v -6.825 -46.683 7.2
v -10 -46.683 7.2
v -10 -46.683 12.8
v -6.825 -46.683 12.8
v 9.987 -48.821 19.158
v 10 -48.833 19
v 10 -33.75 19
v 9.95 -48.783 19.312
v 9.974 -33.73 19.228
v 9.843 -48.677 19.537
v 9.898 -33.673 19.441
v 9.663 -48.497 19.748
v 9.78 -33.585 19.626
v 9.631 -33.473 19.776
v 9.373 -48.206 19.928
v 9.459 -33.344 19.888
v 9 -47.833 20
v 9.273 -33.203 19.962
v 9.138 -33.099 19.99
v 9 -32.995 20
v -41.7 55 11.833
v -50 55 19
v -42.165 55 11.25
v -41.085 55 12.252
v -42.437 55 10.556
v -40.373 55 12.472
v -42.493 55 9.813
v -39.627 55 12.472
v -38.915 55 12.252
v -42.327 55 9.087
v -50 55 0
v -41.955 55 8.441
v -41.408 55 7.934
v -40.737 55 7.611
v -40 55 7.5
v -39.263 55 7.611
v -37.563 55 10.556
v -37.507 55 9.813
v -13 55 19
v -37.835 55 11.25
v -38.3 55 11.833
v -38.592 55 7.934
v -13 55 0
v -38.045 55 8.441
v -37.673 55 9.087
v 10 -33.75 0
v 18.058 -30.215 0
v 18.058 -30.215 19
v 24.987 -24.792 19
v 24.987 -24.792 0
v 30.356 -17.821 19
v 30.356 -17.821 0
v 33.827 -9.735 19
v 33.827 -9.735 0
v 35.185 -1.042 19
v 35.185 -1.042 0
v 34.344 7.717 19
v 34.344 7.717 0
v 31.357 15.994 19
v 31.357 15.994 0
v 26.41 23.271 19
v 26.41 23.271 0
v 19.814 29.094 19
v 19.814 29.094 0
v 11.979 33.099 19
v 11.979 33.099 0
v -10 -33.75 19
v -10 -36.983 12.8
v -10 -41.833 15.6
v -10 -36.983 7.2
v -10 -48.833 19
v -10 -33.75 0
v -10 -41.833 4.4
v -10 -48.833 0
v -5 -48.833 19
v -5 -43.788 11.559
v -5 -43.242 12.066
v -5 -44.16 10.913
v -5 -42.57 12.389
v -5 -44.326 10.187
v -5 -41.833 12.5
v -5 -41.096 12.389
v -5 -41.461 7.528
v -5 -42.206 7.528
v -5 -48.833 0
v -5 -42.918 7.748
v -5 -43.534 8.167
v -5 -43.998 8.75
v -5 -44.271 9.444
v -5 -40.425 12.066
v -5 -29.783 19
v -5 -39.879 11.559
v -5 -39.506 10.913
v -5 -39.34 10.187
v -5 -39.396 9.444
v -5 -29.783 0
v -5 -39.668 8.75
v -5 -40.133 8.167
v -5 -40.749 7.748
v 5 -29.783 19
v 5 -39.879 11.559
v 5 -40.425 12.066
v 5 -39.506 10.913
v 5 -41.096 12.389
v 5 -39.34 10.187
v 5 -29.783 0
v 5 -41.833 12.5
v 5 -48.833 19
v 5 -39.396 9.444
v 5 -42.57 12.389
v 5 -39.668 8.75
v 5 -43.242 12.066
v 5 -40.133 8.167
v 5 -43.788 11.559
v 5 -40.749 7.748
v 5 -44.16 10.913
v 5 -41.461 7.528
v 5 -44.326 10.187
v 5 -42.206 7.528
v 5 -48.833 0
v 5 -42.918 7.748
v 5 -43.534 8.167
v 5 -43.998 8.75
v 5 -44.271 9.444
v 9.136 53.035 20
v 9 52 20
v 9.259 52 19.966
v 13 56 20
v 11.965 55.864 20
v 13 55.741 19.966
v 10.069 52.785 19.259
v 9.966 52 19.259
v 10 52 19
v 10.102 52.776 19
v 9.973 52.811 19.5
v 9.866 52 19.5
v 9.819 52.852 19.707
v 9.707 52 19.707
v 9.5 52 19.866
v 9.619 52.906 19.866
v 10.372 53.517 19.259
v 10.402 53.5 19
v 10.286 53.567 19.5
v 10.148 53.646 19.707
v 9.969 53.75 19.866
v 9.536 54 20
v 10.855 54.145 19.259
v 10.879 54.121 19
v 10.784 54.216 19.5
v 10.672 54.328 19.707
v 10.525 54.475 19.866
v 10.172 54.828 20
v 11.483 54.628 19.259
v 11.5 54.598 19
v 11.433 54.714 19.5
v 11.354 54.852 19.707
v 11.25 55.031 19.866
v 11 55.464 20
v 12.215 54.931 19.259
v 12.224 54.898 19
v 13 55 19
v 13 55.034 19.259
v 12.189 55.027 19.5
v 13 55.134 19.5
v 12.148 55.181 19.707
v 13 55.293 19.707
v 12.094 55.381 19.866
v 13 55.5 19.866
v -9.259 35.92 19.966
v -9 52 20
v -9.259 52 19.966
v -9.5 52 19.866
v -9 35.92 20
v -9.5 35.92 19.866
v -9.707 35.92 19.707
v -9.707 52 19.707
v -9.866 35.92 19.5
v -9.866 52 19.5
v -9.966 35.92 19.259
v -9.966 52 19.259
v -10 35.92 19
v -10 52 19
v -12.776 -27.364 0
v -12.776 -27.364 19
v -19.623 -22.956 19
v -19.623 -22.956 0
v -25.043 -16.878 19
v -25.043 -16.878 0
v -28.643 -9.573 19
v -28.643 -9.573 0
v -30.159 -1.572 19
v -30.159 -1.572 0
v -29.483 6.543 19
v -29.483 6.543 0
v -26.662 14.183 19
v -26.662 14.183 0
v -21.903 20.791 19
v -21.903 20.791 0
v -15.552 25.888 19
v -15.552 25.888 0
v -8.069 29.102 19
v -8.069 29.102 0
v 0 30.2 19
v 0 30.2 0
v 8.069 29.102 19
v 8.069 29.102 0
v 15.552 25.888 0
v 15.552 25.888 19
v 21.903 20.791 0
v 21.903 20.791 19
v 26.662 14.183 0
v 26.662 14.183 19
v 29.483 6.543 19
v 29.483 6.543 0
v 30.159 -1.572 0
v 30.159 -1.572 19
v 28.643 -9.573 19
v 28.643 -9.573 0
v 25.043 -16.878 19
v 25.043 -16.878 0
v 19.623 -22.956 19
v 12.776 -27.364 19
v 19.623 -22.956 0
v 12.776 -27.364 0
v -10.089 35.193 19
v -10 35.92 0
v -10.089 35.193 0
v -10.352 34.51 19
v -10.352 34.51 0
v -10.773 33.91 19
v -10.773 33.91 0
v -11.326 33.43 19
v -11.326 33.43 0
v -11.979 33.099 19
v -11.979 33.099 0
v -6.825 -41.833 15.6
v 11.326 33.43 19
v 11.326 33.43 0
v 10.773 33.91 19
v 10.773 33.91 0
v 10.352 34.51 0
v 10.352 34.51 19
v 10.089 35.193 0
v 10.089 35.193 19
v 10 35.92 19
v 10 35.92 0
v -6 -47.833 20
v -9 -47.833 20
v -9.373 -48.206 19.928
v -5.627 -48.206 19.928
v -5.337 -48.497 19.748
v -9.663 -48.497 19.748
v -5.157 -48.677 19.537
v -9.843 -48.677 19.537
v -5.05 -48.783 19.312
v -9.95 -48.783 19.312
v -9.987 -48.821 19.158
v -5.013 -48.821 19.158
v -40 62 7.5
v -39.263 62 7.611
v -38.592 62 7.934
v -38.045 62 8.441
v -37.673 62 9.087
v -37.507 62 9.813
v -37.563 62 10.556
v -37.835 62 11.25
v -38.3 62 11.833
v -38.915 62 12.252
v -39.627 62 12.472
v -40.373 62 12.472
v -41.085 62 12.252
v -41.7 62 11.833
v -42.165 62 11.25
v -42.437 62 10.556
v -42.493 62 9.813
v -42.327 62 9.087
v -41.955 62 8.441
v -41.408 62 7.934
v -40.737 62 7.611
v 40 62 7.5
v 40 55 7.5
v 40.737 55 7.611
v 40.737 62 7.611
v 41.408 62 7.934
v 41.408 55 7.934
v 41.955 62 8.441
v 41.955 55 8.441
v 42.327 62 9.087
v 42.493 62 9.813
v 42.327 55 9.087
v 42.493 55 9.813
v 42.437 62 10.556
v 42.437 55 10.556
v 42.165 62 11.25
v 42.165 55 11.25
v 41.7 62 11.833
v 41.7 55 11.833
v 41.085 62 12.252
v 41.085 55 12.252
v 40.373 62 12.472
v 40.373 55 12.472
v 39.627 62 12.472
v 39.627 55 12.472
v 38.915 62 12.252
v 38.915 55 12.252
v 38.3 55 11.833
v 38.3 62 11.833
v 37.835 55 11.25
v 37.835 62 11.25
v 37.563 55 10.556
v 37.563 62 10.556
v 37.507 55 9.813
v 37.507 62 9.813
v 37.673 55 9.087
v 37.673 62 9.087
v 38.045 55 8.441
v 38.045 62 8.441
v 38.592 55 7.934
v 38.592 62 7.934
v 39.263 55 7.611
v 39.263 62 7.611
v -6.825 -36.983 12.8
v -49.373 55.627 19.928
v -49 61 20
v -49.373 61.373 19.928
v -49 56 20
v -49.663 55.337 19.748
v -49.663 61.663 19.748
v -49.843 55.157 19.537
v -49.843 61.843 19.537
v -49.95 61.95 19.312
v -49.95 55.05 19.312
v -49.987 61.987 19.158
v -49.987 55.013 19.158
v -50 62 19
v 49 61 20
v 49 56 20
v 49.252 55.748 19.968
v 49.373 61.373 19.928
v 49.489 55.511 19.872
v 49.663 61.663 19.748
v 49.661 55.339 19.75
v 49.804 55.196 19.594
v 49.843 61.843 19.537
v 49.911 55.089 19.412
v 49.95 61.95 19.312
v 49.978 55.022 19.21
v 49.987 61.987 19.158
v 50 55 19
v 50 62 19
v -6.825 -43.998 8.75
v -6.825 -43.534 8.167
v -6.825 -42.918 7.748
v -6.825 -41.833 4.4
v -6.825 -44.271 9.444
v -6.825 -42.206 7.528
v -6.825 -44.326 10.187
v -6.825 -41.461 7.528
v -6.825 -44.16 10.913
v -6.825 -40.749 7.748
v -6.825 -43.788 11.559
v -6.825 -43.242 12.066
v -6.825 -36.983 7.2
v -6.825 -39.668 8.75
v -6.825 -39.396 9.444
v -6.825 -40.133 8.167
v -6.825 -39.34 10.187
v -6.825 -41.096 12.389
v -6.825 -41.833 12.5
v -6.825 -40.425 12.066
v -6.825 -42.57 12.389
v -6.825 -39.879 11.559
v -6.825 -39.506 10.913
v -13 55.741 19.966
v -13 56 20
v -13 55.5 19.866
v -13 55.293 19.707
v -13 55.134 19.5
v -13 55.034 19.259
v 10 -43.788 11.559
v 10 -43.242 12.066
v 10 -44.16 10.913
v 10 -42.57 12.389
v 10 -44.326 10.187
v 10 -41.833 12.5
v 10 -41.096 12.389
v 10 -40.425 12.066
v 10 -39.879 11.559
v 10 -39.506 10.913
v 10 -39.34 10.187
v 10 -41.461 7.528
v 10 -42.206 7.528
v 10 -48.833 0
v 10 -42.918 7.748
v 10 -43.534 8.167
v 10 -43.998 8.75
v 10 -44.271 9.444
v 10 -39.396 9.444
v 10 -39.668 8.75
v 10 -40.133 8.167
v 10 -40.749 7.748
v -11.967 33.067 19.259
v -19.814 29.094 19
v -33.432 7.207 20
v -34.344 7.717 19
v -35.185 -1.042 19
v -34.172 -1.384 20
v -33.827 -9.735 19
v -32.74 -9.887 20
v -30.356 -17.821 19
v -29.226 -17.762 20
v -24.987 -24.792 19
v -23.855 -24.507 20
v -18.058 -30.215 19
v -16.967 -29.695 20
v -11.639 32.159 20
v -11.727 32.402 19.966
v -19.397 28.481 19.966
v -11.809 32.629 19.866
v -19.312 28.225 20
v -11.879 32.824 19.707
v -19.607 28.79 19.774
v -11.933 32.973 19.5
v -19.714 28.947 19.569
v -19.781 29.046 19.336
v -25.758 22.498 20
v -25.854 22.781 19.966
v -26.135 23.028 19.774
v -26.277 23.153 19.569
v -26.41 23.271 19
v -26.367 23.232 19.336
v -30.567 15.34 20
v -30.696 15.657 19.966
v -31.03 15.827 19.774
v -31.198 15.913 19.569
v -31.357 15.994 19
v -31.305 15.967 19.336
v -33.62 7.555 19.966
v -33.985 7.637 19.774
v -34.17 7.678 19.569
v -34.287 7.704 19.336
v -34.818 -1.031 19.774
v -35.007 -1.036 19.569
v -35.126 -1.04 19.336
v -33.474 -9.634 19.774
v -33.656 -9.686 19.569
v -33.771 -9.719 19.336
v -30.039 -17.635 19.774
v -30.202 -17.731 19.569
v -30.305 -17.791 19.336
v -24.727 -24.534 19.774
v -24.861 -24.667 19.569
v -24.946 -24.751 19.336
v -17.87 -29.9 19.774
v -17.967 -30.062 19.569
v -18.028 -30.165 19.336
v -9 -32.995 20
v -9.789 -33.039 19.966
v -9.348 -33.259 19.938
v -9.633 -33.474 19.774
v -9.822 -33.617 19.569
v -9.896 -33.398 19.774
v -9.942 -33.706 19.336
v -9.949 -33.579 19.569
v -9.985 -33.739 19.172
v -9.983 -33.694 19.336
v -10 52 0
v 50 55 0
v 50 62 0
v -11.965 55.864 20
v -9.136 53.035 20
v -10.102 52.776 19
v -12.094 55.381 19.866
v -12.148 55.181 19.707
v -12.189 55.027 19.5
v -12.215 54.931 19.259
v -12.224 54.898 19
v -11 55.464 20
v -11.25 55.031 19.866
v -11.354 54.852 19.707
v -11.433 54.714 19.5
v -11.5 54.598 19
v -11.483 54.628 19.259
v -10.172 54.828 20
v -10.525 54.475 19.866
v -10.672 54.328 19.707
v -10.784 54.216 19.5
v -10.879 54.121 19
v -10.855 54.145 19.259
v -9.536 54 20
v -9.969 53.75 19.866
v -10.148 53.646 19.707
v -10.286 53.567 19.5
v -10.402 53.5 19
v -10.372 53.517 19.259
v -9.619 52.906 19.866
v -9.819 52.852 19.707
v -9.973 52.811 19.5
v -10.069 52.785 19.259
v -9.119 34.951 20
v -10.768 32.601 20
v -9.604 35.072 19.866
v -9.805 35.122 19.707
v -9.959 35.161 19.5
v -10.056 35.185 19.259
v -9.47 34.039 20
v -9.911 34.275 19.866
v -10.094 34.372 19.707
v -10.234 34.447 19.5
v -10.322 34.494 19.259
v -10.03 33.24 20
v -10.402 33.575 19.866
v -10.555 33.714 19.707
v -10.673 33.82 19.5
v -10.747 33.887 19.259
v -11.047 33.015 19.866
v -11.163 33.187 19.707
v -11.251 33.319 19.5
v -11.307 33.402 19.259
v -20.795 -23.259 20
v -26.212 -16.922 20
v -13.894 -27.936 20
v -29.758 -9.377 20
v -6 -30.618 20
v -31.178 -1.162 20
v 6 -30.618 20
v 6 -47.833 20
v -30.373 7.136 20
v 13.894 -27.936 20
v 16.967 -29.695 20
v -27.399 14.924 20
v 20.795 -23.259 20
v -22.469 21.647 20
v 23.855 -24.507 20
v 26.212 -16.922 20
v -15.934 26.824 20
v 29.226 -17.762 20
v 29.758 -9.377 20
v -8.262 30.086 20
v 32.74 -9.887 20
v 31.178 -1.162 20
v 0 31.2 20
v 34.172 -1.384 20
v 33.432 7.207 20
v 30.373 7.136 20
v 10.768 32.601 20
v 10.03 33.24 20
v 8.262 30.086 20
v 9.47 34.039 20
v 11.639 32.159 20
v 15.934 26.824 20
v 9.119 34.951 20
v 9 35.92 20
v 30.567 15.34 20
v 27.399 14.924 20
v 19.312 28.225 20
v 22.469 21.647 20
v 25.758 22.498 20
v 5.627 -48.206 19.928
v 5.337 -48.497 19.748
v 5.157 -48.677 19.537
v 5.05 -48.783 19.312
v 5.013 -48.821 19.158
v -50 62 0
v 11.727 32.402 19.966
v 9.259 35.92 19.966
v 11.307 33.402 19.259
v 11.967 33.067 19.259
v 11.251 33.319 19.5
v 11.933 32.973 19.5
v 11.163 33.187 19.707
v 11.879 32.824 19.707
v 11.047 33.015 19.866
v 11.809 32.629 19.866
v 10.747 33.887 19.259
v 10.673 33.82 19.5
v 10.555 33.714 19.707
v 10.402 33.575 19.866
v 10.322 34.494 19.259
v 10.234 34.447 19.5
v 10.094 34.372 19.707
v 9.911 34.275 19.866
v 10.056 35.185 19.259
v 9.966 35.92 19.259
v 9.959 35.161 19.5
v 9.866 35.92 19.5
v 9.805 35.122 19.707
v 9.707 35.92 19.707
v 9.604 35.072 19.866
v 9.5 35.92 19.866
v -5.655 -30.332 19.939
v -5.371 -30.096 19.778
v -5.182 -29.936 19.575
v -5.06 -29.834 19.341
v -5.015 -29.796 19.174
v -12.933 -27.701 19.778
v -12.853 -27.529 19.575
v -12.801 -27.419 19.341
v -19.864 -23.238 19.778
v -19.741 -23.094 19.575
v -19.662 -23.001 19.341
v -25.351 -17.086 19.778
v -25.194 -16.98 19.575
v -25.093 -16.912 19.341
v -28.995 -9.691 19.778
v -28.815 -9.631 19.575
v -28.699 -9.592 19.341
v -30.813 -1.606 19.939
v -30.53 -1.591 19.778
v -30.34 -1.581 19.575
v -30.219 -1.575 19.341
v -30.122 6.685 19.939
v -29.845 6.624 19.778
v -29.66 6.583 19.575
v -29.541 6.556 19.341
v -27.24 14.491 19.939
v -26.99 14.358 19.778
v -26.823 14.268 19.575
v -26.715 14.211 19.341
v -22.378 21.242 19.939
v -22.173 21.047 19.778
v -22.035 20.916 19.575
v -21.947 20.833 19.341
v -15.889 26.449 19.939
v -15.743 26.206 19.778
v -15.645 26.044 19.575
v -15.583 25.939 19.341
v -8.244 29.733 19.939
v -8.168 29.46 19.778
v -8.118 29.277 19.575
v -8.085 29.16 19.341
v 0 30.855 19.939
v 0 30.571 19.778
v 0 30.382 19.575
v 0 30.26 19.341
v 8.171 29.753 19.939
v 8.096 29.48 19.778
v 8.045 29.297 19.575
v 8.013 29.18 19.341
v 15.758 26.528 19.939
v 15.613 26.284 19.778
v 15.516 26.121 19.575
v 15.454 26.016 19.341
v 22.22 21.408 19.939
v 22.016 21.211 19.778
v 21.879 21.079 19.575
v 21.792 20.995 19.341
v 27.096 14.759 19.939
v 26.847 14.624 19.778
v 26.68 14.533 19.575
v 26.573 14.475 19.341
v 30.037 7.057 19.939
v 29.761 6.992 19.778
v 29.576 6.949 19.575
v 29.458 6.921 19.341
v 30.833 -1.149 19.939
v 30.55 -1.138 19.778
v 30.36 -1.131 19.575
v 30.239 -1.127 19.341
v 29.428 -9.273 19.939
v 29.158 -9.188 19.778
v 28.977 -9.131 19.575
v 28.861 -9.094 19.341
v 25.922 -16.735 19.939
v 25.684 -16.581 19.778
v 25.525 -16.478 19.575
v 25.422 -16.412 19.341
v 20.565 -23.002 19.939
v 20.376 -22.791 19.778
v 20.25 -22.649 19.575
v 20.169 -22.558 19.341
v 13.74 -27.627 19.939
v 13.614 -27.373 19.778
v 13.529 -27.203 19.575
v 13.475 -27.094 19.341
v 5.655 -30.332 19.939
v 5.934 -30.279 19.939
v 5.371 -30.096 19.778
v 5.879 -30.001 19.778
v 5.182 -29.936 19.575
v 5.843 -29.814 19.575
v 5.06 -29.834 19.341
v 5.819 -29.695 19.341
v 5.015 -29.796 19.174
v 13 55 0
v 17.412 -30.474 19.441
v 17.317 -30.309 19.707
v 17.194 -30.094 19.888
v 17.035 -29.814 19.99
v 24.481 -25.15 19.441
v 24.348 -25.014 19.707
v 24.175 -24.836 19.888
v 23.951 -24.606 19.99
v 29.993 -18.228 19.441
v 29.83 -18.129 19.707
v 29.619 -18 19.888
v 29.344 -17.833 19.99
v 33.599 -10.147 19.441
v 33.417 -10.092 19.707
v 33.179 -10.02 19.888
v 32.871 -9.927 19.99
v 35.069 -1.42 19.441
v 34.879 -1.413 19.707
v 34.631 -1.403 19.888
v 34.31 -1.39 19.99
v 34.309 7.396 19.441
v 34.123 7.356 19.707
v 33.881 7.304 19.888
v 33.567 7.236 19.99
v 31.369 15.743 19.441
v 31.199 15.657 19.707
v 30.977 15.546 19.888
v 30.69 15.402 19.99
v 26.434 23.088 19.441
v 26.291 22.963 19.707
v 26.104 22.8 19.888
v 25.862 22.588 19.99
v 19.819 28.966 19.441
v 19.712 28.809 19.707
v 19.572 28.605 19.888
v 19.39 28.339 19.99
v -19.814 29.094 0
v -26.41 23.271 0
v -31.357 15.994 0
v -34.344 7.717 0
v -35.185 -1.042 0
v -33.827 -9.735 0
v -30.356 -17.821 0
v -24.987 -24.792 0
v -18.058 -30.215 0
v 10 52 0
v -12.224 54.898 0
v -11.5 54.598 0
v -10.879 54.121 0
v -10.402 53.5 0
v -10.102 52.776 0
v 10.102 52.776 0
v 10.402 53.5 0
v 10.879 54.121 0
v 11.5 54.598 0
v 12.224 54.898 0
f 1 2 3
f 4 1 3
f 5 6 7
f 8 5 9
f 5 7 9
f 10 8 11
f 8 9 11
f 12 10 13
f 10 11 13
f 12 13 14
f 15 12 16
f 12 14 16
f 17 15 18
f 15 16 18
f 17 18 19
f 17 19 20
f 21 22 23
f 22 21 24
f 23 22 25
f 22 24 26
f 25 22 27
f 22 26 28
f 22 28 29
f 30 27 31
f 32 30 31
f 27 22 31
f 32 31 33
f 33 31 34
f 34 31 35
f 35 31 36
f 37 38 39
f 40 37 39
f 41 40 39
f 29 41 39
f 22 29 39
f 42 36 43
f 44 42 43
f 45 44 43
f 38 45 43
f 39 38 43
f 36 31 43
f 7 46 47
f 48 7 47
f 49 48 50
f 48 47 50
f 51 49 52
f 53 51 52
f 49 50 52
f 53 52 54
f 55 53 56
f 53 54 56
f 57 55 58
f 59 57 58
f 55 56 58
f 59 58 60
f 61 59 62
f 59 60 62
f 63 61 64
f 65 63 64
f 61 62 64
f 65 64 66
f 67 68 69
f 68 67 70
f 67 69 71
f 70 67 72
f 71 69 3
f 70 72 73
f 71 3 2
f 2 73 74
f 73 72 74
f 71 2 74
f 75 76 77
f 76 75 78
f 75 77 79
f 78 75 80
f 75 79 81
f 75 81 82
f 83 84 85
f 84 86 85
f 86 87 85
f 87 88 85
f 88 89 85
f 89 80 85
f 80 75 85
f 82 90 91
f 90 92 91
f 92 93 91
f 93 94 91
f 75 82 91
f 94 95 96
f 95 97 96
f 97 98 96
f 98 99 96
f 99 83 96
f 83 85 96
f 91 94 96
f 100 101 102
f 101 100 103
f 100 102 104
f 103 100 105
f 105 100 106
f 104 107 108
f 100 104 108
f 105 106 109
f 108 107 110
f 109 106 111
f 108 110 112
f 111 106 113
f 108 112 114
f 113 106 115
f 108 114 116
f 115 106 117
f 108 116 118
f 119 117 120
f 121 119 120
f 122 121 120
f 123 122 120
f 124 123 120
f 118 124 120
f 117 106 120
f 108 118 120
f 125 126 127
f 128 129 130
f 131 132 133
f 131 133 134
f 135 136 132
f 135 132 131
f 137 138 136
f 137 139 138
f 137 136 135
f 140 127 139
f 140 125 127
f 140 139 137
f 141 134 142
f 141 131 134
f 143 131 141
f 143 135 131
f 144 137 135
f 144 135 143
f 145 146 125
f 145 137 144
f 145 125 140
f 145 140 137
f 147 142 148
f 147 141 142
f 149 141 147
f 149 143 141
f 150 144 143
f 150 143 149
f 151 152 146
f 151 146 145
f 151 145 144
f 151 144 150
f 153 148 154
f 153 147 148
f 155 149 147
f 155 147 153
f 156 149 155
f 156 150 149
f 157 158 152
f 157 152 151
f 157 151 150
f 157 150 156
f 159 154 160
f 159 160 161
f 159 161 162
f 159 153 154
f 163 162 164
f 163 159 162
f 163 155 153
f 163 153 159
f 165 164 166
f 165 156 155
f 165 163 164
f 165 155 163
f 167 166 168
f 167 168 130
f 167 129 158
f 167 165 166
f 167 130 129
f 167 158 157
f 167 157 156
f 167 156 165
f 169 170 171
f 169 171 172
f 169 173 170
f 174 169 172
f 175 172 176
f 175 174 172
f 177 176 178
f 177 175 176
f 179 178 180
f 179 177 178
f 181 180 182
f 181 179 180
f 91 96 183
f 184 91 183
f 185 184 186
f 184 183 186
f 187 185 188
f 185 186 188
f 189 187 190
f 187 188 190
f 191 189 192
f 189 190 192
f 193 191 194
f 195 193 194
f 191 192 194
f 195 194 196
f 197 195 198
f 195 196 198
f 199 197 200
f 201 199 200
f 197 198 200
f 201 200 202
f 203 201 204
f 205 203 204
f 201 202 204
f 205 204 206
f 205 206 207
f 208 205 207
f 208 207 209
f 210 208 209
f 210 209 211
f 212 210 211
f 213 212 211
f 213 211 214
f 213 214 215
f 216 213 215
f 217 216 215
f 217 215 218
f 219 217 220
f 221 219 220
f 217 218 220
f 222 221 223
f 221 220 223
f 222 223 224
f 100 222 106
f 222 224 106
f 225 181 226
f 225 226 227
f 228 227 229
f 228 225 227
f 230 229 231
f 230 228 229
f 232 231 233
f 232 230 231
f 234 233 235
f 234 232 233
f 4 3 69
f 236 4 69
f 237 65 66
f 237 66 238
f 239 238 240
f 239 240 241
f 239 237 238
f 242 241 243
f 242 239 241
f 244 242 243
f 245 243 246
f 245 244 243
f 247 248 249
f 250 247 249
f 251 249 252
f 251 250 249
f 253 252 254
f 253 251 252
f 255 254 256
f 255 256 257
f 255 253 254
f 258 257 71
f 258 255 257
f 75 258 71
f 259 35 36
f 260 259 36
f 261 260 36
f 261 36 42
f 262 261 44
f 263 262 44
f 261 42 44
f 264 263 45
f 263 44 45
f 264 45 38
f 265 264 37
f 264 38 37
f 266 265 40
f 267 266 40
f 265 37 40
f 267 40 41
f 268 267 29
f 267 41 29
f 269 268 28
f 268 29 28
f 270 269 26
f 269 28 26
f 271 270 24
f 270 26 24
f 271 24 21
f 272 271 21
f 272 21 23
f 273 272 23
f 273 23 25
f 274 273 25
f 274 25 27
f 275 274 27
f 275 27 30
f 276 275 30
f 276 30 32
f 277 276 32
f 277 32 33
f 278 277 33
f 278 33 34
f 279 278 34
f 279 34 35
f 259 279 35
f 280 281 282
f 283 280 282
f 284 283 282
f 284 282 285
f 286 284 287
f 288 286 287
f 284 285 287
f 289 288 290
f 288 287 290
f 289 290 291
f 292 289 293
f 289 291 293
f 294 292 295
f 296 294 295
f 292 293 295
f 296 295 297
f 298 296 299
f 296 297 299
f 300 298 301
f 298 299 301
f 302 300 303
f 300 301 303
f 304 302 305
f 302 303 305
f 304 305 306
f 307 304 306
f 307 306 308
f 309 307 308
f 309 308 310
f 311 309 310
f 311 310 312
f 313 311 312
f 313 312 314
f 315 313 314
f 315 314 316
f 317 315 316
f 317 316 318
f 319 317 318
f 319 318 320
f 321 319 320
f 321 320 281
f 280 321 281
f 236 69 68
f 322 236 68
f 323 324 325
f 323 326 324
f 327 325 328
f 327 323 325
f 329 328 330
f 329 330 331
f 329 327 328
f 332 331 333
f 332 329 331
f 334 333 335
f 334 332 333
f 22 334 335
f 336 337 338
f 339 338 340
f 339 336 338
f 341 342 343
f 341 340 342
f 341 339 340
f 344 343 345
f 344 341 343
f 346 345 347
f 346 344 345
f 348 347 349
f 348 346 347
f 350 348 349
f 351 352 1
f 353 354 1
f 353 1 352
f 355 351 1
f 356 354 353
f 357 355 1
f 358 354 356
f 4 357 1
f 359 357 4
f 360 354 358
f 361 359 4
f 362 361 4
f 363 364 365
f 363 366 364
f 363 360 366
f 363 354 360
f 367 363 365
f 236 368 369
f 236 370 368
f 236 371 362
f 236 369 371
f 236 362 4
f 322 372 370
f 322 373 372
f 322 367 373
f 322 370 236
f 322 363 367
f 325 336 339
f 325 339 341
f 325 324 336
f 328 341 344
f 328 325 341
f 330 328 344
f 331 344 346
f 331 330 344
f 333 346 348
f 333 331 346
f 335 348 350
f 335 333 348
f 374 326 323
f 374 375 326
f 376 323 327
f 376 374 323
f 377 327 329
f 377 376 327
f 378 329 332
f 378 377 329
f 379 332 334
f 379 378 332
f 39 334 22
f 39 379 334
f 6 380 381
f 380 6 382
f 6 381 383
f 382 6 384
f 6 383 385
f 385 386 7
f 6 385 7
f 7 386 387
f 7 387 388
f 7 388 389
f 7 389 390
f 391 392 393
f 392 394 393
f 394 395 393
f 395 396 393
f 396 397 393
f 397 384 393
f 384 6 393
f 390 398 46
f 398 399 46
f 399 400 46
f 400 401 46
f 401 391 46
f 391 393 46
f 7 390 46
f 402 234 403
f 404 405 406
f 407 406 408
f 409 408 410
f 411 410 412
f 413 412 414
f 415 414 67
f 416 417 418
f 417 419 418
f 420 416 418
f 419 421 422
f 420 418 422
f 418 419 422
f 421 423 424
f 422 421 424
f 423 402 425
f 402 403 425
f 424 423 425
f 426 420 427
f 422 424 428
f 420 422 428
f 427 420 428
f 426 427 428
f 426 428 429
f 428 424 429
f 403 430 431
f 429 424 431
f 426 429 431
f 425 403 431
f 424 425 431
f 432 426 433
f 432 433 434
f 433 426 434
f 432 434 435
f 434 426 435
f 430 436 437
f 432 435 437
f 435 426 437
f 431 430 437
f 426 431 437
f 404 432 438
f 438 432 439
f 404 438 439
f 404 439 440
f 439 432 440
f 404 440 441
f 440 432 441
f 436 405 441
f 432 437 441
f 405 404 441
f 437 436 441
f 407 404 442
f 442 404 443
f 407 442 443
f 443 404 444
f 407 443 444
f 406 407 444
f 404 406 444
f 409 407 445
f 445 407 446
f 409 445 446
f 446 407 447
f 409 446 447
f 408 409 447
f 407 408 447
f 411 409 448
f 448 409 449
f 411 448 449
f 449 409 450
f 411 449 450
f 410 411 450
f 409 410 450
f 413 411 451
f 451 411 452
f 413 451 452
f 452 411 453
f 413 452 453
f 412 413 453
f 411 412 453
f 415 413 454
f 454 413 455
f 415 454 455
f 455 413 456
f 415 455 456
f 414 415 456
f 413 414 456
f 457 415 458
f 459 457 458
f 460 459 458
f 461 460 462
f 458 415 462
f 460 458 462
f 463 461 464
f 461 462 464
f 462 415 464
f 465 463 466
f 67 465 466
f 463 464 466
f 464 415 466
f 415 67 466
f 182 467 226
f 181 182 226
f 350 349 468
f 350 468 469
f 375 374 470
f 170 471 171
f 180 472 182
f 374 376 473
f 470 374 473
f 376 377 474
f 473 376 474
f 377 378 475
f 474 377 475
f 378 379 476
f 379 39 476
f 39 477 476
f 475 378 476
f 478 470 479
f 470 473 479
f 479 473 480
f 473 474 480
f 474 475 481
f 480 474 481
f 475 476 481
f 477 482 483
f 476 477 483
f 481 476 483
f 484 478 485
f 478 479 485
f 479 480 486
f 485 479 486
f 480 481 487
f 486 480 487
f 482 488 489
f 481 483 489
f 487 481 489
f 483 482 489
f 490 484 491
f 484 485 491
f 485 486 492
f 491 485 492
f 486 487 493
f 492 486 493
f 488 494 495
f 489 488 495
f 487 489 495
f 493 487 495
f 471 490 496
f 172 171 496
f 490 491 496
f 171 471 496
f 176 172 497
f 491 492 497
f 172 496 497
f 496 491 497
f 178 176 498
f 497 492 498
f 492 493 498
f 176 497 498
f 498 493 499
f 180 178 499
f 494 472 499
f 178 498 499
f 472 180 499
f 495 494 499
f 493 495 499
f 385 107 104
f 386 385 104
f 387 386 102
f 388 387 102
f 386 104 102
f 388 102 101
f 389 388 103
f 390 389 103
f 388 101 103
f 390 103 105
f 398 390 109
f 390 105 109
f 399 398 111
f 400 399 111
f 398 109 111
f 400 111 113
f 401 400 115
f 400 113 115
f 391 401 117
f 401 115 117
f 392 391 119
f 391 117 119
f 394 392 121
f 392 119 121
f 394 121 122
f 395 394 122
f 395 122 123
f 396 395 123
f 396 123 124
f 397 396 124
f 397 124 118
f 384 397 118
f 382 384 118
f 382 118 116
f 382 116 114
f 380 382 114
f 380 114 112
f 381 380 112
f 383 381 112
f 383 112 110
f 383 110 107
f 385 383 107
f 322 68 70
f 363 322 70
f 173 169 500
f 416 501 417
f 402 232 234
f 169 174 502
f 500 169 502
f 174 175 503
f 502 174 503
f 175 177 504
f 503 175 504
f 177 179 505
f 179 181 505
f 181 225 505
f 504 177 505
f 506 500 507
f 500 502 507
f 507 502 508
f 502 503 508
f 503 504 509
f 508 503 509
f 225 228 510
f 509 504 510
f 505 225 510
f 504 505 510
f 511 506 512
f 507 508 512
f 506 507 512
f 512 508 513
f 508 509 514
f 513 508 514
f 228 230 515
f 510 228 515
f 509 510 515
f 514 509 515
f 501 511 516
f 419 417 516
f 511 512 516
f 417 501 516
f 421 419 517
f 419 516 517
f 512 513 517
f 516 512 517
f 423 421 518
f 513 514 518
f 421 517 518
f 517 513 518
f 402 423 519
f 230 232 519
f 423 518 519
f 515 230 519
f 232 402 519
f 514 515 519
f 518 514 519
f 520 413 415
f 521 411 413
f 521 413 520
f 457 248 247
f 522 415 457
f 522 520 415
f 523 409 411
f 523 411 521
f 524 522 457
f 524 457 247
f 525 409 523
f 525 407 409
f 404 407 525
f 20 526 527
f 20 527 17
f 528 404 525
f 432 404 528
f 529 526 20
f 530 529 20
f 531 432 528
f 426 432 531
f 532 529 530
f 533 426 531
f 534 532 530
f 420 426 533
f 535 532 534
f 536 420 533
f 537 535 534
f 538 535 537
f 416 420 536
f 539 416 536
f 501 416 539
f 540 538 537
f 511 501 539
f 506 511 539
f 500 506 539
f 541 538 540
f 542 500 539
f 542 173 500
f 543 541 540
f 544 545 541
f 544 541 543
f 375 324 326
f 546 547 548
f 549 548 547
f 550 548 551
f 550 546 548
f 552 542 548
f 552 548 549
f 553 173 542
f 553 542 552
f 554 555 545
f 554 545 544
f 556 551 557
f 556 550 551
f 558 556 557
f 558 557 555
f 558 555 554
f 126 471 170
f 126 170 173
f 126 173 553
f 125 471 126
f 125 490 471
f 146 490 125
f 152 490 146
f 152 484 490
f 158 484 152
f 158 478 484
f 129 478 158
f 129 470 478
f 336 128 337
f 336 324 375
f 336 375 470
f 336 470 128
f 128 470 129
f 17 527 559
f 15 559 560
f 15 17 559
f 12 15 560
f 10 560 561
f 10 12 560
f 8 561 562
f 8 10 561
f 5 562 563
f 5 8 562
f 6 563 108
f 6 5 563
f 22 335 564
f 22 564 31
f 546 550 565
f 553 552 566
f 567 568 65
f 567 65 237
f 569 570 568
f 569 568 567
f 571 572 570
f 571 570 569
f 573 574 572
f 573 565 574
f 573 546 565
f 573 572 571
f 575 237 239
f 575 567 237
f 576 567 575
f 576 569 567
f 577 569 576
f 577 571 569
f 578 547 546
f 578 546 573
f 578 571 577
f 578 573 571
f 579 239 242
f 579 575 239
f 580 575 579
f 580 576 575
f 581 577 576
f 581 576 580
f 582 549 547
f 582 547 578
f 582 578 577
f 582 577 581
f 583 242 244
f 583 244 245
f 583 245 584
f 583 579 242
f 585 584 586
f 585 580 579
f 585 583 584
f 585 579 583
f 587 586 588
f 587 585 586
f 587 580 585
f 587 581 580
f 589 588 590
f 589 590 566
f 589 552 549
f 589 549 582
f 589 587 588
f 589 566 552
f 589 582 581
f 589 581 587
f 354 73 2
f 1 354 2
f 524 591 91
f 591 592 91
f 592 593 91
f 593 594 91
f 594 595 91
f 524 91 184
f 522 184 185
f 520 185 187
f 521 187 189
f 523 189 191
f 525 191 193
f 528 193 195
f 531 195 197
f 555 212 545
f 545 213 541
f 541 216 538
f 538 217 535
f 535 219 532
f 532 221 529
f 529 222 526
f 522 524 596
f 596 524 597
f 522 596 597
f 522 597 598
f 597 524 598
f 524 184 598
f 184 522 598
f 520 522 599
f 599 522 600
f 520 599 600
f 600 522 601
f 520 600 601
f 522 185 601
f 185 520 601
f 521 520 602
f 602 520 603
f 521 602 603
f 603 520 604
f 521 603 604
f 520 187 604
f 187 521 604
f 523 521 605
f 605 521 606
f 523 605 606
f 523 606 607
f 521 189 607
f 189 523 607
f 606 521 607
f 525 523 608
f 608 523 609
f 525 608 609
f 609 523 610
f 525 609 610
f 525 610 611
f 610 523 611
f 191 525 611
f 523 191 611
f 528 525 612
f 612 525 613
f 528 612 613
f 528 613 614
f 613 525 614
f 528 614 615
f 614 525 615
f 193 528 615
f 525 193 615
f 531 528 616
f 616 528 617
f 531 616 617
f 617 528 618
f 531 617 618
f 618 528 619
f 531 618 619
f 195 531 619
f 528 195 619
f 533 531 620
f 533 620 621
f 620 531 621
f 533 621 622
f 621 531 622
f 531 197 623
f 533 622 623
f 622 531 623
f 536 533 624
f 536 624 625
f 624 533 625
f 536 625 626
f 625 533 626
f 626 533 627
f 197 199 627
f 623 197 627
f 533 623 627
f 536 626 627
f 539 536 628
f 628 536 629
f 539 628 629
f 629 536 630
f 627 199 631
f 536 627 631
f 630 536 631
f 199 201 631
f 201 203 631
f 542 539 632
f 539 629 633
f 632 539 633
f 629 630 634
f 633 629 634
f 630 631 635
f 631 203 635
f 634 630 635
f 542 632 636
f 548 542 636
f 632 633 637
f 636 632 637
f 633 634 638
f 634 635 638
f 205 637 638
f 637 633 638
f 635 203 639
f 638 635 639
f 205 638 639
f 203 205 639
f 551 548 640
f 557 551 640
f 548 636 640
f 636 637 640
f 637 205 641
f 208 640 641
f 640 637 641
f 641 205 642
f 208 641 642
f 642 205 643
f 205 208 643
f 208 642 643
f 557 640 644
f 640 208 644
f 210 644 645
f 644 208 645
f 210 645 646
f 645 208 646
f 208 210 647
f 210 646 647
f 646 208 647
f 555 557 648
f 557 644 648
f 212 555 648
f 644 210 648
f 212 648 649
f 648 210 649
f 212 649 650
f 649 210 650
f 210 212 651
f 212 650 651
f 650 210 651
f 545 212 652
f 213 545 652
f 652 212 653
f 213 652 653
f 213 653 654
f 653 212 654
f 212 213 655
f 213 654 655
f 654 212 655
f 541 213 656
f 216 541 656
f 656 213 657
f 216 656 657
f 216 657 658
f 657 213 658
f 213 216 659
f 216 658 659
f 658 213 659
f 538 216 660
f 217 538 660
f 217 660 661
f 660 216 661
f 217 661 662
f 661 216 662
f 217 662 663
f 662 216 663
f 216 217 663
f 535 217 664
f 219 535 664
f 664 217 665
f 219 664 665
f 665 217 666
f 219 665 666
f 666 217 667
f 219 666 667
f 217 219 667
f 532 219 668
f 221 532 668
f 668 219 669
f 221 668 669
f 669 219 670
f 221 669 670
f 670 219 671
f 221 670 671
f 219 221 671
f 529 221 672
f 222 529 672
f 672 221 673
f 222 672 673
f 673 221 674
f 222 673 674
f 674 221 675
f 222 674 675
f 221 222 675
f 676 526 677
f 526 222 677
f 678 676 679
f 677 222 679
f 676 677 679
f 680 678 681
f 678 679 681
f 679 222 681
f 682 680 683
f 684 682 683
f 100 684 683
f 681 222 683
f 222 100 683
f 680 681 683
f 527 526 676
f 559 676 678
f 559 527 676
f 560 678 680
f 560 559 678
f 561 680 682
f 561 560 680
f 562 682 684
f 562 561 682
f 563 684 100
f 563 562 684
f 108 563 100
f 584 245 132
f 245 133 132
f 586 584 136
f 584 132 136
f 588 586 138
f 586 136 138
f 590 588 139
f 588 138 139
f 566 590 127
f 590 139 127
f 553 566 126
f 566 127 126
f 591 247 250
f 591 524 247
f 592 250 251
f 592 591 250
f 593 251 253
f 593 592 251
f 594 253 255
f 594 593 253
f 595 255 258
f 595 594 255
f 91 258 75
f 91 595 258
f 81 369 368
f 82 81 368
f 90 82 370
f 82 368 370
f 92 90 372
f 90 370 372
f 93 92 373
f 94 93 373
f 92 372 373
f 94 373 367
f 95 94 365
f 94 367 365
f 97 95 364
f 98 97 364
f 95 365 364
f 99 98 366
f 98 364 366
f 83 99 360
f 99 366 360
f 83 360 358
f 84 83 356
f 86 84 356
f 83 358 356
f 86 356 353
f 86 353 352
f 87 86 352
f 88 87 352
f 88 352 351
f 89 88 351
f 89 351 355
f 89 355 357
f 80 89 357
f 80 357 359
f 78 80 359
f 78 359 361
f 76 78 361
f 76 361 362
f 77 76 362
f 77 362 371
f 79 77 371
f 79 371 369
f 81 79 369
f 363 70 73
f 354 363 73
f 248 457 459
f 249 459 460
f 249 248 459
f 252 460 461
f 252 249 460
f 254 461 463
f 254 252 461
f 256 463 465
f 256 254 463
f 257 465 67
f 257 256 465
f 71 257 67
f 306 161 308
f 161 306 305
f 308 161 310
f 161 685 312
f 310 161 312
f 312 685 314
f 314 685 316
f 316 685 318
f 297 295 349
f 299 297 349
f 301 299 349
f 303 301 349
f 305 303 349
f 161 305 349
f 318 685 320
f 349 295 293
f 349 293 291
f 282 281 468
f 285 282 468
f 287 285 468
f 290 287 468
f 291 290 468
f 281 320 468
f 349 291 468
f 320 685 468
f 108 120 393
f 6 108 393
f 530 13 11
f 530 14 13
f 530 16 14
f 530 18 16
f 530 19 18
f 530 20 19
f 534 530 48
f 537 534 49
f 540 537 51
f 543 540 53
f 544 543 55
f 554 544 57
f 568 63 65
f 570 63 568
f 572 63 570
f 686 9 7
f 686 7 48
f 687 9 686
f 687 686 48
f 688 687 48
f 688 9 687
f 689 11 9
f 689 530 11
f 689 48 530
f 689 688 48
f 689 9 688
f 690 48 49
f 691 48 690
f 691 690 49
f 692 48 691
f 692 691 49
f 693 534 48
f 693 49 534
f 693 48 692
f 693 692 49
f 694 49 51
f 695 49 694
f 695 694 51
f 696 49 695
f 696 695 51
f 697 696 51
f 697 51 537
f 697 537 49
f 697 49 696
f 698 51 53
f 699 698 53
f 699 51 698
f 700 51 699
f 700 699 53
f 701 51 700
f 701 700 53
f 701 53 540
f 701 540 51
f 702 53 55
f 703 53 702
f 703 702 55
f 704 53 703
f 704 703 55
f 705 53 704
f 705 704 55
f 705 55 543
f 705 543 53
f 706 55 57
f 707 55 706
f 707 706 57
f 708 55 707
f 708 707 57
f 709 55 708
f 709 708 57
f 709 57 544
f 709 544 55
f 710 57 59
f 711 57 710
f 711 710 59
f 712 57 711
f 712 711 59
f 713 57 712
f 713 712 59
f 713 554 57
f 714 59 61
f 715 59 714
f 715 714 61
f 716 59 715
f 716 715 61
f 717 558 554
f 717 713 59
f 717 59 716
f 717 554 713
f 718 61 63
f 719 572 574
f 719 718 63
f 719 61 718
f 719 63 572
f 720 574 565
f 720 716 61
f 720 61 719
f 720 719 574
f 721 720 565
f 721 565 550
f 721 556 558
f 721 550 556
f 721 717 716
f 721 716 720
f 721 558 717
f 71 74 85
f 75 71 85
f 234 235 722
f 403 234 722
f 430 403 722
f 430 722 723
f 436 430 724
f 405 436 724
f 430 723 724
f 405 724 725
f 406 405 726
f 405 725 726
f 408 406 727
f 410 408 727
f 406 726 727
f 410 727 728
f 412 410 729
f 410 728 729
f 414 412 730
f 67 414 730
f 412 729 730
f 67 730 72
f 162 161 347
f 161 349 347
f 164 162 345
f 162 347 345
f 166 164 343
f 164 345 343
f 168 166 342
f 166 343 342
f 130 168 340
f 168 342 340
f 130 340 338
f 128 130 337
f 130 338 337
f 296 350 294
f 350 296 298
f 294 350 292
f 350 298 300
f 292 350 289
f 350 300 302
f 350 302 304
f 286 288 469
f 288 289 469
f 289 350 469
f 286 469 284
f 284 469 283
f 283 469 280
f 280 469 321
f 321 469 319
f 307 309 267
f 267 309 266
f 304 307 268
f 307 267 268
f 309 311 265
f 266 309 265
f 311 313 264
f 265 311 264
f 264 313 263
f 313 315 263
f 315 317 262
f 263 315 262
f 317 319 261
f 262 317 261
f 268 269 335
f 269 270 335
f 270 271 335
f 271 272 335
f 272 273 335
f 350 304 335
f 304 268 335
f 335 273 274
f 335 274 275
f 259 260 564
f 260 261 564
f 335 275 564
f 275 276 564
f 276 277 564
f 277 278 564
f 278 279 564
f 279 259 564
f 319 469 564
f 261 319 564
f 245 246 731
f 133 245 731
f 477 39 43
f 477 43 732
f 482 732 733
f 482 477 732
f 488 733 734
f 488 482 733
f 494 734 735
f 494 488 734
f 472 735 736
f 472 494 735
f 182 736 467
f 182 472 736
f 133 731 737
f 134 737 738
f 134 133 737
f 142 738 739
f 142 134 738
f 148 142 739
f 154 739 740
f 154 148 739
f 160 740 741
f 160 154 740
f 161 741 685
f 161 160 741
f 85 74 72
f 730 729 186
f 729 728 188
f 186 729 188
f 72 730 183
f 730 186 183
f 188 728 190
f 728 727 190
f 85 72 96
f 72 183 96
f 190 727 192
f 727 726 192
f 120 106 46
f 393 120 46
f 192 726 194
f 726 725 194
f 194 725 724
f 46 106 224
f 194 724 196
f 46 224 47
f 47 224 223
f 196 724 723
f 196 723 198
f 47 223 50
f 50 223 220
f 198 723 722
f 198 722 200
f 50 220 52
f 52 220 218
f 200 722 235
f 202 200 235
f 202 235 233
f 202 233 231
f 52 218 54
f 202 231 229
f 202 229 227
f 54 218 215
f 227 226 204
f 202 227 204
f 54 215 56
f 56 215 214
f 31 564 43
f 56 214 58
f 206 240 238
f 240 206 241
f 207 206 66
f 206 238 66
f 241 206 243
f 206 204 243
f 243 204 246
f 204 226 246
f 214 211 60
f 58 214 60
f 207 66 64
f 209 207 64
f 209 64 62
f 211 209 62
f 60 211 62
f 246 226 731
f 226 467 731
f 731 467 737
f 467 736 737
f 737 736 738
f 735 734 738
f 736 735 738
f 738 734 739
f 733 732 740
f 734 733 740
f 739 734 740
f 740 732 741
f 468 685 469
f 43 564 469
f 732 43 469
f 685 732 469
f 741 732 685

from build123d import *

# Parameters (mm, degrees)
BOSS_EXTRUDE1_DEPTH = 20
FILLET1_R           = 3
SKETCH2_R           = 2.5
CUT_EXTRUDE1_DEPTH  = 117.967247128
SKETCH3_R           = 2.5
CUT_EXTRUDE2_DEPTH  = 89.566359302
SKETCH3_4_R         = 2.5
CUT_EXTRUDE3_DEPTH  = 3.175
FILLET2_R           = 1


with BuildPart() as part:
    # Sketch1 → Boss-Extrude1 (new body)
    with BuildSketch(Plane.XY):
        with BuildLine():
            ThreePointArc((-5, -29.78321675), (0, 30.2), (5, -29.78321675))
            Line((5, -29.78321675), (5, -48.83321675))
            Line((5, -48.83321675), (10, -48.83321675))
            Line((10, -48.83321675), (10, -33.749666665))
            ThreePointArc((10, -33.749666665), (35.2, 0), (10, 33.749666665))
            Line((10, 33.749666665), (10, 55))
            Line((10, 55), (50, 55))
            Line((50, 55), (50, 62))
            Line((50, 62), (-50, 62))
            Line((-50, 62), (-50, 55))
            Line((-50, 55), (-10, 55))
            Line((-10, 55), (-10, 33.749666665))
            ThreePointArc((-10, 33.749666665), (-35.2, 0), (-10, -33.749666665))
            Line((-10, -33.749666665), (-10, -48.83321675))
            Line((-10, -48.83321675), (-5, -48.83321675))
            Line((-5, -48.83321675), (-5, -29.78321675))
        make_face()
    extrude(amount=BOSS_EXTRUDE1_DEPTH)

    # Fillet1
    fillet1_edges = [part.edges().sort_by_distance(p)[0] for p in [
        (10, 33.749666665, 10),
        (10, 55, 10),
        (-10, 33.749666665, 10),
        (-10, 55, 10),
    ]]
    fillet(fillet1_edges, radius=FILLET1_R)

    # Sketch2 → Cut-Extrude1 (cut, through all)
    with BuildSketch(Plane(origin=(0, 55, 0), x_dir=(-1, 0, 0), z_dir=(0, -1, 0))):
        with Locations((40, -10)):
            Circle(SKETCH2_R)
        with Locations((-40, -10)):
            Circle(SKETCH2_R)
    extrude(amount=-CUT_EXTRUDE1_DEPTH, mode=Mode.SUBTRACT)

    # Sketch3 → Cut-Extrude2 (cut, through all)
    with BuildSketch(Plane.ZY.offset(10)):
        with Locations((10, -41.83321675)):
            Circle(SKETCH3_R)
    extrude(amount=-CUT_EXTRUDE2_DEPTH, mode=Mode.SUBTRACT)

    # Sketch3<4> → Cut-Extrude3 (cut)
    with BuildSketch(Plane.ZY.offset(10)):
        Polygon((15.600297611, -41.83321675), (12.800148806, -36.98321675), (7.199851194, -36.98321675), (4.399702389, -41.83321675), (7.199851194, -46.68321675), (12.800148806, -46.68321675), align=None)
        with Locations((10, -41.83321675)):
            Circle(SKETCH3_4_R, mode=Mode.SUBTRACT)
    extrude(amount=-CUT_EXTRUDE3_DEPTH, mode=Mode.SUBTRACT)

    # Fillet2
    fillet2_edges = [part.edges().sort_by_distance(p)[0] for p in [
        (-50, 58.5, 20),
        (0, 62, 20),
        (50, 58.5, 20),
        (31.5, 55, 20),
        (10.878679656, 54.121320344, 20),
        (10, 43.959955457, 20),
        (10.544106352, 34.196952298, 20),
        (35.184584451, -1.041641486, 20),
        (10, -41.291441708, 20),
        (7.5, -48.83321675, 20),
        (5, -39.30821675, 20),
        (0, 30.2, 20),
        (-5, -39.30821675, 20),
        (-7.5, -48.83321675, 20),
        (-10, -41.291441708, 20),
        (-35.184584451, -1.041641486, 20),
        (-10.544106352, 34.196952298, 20),
        (-10, 43.959955457, 20),
        (-10.878679656, 54.121320344, 20),
        (-31.5, 55, 20),
    ]]
    fillet(fillet2_edges, radius=FILLET2_R)


solid = part.part
